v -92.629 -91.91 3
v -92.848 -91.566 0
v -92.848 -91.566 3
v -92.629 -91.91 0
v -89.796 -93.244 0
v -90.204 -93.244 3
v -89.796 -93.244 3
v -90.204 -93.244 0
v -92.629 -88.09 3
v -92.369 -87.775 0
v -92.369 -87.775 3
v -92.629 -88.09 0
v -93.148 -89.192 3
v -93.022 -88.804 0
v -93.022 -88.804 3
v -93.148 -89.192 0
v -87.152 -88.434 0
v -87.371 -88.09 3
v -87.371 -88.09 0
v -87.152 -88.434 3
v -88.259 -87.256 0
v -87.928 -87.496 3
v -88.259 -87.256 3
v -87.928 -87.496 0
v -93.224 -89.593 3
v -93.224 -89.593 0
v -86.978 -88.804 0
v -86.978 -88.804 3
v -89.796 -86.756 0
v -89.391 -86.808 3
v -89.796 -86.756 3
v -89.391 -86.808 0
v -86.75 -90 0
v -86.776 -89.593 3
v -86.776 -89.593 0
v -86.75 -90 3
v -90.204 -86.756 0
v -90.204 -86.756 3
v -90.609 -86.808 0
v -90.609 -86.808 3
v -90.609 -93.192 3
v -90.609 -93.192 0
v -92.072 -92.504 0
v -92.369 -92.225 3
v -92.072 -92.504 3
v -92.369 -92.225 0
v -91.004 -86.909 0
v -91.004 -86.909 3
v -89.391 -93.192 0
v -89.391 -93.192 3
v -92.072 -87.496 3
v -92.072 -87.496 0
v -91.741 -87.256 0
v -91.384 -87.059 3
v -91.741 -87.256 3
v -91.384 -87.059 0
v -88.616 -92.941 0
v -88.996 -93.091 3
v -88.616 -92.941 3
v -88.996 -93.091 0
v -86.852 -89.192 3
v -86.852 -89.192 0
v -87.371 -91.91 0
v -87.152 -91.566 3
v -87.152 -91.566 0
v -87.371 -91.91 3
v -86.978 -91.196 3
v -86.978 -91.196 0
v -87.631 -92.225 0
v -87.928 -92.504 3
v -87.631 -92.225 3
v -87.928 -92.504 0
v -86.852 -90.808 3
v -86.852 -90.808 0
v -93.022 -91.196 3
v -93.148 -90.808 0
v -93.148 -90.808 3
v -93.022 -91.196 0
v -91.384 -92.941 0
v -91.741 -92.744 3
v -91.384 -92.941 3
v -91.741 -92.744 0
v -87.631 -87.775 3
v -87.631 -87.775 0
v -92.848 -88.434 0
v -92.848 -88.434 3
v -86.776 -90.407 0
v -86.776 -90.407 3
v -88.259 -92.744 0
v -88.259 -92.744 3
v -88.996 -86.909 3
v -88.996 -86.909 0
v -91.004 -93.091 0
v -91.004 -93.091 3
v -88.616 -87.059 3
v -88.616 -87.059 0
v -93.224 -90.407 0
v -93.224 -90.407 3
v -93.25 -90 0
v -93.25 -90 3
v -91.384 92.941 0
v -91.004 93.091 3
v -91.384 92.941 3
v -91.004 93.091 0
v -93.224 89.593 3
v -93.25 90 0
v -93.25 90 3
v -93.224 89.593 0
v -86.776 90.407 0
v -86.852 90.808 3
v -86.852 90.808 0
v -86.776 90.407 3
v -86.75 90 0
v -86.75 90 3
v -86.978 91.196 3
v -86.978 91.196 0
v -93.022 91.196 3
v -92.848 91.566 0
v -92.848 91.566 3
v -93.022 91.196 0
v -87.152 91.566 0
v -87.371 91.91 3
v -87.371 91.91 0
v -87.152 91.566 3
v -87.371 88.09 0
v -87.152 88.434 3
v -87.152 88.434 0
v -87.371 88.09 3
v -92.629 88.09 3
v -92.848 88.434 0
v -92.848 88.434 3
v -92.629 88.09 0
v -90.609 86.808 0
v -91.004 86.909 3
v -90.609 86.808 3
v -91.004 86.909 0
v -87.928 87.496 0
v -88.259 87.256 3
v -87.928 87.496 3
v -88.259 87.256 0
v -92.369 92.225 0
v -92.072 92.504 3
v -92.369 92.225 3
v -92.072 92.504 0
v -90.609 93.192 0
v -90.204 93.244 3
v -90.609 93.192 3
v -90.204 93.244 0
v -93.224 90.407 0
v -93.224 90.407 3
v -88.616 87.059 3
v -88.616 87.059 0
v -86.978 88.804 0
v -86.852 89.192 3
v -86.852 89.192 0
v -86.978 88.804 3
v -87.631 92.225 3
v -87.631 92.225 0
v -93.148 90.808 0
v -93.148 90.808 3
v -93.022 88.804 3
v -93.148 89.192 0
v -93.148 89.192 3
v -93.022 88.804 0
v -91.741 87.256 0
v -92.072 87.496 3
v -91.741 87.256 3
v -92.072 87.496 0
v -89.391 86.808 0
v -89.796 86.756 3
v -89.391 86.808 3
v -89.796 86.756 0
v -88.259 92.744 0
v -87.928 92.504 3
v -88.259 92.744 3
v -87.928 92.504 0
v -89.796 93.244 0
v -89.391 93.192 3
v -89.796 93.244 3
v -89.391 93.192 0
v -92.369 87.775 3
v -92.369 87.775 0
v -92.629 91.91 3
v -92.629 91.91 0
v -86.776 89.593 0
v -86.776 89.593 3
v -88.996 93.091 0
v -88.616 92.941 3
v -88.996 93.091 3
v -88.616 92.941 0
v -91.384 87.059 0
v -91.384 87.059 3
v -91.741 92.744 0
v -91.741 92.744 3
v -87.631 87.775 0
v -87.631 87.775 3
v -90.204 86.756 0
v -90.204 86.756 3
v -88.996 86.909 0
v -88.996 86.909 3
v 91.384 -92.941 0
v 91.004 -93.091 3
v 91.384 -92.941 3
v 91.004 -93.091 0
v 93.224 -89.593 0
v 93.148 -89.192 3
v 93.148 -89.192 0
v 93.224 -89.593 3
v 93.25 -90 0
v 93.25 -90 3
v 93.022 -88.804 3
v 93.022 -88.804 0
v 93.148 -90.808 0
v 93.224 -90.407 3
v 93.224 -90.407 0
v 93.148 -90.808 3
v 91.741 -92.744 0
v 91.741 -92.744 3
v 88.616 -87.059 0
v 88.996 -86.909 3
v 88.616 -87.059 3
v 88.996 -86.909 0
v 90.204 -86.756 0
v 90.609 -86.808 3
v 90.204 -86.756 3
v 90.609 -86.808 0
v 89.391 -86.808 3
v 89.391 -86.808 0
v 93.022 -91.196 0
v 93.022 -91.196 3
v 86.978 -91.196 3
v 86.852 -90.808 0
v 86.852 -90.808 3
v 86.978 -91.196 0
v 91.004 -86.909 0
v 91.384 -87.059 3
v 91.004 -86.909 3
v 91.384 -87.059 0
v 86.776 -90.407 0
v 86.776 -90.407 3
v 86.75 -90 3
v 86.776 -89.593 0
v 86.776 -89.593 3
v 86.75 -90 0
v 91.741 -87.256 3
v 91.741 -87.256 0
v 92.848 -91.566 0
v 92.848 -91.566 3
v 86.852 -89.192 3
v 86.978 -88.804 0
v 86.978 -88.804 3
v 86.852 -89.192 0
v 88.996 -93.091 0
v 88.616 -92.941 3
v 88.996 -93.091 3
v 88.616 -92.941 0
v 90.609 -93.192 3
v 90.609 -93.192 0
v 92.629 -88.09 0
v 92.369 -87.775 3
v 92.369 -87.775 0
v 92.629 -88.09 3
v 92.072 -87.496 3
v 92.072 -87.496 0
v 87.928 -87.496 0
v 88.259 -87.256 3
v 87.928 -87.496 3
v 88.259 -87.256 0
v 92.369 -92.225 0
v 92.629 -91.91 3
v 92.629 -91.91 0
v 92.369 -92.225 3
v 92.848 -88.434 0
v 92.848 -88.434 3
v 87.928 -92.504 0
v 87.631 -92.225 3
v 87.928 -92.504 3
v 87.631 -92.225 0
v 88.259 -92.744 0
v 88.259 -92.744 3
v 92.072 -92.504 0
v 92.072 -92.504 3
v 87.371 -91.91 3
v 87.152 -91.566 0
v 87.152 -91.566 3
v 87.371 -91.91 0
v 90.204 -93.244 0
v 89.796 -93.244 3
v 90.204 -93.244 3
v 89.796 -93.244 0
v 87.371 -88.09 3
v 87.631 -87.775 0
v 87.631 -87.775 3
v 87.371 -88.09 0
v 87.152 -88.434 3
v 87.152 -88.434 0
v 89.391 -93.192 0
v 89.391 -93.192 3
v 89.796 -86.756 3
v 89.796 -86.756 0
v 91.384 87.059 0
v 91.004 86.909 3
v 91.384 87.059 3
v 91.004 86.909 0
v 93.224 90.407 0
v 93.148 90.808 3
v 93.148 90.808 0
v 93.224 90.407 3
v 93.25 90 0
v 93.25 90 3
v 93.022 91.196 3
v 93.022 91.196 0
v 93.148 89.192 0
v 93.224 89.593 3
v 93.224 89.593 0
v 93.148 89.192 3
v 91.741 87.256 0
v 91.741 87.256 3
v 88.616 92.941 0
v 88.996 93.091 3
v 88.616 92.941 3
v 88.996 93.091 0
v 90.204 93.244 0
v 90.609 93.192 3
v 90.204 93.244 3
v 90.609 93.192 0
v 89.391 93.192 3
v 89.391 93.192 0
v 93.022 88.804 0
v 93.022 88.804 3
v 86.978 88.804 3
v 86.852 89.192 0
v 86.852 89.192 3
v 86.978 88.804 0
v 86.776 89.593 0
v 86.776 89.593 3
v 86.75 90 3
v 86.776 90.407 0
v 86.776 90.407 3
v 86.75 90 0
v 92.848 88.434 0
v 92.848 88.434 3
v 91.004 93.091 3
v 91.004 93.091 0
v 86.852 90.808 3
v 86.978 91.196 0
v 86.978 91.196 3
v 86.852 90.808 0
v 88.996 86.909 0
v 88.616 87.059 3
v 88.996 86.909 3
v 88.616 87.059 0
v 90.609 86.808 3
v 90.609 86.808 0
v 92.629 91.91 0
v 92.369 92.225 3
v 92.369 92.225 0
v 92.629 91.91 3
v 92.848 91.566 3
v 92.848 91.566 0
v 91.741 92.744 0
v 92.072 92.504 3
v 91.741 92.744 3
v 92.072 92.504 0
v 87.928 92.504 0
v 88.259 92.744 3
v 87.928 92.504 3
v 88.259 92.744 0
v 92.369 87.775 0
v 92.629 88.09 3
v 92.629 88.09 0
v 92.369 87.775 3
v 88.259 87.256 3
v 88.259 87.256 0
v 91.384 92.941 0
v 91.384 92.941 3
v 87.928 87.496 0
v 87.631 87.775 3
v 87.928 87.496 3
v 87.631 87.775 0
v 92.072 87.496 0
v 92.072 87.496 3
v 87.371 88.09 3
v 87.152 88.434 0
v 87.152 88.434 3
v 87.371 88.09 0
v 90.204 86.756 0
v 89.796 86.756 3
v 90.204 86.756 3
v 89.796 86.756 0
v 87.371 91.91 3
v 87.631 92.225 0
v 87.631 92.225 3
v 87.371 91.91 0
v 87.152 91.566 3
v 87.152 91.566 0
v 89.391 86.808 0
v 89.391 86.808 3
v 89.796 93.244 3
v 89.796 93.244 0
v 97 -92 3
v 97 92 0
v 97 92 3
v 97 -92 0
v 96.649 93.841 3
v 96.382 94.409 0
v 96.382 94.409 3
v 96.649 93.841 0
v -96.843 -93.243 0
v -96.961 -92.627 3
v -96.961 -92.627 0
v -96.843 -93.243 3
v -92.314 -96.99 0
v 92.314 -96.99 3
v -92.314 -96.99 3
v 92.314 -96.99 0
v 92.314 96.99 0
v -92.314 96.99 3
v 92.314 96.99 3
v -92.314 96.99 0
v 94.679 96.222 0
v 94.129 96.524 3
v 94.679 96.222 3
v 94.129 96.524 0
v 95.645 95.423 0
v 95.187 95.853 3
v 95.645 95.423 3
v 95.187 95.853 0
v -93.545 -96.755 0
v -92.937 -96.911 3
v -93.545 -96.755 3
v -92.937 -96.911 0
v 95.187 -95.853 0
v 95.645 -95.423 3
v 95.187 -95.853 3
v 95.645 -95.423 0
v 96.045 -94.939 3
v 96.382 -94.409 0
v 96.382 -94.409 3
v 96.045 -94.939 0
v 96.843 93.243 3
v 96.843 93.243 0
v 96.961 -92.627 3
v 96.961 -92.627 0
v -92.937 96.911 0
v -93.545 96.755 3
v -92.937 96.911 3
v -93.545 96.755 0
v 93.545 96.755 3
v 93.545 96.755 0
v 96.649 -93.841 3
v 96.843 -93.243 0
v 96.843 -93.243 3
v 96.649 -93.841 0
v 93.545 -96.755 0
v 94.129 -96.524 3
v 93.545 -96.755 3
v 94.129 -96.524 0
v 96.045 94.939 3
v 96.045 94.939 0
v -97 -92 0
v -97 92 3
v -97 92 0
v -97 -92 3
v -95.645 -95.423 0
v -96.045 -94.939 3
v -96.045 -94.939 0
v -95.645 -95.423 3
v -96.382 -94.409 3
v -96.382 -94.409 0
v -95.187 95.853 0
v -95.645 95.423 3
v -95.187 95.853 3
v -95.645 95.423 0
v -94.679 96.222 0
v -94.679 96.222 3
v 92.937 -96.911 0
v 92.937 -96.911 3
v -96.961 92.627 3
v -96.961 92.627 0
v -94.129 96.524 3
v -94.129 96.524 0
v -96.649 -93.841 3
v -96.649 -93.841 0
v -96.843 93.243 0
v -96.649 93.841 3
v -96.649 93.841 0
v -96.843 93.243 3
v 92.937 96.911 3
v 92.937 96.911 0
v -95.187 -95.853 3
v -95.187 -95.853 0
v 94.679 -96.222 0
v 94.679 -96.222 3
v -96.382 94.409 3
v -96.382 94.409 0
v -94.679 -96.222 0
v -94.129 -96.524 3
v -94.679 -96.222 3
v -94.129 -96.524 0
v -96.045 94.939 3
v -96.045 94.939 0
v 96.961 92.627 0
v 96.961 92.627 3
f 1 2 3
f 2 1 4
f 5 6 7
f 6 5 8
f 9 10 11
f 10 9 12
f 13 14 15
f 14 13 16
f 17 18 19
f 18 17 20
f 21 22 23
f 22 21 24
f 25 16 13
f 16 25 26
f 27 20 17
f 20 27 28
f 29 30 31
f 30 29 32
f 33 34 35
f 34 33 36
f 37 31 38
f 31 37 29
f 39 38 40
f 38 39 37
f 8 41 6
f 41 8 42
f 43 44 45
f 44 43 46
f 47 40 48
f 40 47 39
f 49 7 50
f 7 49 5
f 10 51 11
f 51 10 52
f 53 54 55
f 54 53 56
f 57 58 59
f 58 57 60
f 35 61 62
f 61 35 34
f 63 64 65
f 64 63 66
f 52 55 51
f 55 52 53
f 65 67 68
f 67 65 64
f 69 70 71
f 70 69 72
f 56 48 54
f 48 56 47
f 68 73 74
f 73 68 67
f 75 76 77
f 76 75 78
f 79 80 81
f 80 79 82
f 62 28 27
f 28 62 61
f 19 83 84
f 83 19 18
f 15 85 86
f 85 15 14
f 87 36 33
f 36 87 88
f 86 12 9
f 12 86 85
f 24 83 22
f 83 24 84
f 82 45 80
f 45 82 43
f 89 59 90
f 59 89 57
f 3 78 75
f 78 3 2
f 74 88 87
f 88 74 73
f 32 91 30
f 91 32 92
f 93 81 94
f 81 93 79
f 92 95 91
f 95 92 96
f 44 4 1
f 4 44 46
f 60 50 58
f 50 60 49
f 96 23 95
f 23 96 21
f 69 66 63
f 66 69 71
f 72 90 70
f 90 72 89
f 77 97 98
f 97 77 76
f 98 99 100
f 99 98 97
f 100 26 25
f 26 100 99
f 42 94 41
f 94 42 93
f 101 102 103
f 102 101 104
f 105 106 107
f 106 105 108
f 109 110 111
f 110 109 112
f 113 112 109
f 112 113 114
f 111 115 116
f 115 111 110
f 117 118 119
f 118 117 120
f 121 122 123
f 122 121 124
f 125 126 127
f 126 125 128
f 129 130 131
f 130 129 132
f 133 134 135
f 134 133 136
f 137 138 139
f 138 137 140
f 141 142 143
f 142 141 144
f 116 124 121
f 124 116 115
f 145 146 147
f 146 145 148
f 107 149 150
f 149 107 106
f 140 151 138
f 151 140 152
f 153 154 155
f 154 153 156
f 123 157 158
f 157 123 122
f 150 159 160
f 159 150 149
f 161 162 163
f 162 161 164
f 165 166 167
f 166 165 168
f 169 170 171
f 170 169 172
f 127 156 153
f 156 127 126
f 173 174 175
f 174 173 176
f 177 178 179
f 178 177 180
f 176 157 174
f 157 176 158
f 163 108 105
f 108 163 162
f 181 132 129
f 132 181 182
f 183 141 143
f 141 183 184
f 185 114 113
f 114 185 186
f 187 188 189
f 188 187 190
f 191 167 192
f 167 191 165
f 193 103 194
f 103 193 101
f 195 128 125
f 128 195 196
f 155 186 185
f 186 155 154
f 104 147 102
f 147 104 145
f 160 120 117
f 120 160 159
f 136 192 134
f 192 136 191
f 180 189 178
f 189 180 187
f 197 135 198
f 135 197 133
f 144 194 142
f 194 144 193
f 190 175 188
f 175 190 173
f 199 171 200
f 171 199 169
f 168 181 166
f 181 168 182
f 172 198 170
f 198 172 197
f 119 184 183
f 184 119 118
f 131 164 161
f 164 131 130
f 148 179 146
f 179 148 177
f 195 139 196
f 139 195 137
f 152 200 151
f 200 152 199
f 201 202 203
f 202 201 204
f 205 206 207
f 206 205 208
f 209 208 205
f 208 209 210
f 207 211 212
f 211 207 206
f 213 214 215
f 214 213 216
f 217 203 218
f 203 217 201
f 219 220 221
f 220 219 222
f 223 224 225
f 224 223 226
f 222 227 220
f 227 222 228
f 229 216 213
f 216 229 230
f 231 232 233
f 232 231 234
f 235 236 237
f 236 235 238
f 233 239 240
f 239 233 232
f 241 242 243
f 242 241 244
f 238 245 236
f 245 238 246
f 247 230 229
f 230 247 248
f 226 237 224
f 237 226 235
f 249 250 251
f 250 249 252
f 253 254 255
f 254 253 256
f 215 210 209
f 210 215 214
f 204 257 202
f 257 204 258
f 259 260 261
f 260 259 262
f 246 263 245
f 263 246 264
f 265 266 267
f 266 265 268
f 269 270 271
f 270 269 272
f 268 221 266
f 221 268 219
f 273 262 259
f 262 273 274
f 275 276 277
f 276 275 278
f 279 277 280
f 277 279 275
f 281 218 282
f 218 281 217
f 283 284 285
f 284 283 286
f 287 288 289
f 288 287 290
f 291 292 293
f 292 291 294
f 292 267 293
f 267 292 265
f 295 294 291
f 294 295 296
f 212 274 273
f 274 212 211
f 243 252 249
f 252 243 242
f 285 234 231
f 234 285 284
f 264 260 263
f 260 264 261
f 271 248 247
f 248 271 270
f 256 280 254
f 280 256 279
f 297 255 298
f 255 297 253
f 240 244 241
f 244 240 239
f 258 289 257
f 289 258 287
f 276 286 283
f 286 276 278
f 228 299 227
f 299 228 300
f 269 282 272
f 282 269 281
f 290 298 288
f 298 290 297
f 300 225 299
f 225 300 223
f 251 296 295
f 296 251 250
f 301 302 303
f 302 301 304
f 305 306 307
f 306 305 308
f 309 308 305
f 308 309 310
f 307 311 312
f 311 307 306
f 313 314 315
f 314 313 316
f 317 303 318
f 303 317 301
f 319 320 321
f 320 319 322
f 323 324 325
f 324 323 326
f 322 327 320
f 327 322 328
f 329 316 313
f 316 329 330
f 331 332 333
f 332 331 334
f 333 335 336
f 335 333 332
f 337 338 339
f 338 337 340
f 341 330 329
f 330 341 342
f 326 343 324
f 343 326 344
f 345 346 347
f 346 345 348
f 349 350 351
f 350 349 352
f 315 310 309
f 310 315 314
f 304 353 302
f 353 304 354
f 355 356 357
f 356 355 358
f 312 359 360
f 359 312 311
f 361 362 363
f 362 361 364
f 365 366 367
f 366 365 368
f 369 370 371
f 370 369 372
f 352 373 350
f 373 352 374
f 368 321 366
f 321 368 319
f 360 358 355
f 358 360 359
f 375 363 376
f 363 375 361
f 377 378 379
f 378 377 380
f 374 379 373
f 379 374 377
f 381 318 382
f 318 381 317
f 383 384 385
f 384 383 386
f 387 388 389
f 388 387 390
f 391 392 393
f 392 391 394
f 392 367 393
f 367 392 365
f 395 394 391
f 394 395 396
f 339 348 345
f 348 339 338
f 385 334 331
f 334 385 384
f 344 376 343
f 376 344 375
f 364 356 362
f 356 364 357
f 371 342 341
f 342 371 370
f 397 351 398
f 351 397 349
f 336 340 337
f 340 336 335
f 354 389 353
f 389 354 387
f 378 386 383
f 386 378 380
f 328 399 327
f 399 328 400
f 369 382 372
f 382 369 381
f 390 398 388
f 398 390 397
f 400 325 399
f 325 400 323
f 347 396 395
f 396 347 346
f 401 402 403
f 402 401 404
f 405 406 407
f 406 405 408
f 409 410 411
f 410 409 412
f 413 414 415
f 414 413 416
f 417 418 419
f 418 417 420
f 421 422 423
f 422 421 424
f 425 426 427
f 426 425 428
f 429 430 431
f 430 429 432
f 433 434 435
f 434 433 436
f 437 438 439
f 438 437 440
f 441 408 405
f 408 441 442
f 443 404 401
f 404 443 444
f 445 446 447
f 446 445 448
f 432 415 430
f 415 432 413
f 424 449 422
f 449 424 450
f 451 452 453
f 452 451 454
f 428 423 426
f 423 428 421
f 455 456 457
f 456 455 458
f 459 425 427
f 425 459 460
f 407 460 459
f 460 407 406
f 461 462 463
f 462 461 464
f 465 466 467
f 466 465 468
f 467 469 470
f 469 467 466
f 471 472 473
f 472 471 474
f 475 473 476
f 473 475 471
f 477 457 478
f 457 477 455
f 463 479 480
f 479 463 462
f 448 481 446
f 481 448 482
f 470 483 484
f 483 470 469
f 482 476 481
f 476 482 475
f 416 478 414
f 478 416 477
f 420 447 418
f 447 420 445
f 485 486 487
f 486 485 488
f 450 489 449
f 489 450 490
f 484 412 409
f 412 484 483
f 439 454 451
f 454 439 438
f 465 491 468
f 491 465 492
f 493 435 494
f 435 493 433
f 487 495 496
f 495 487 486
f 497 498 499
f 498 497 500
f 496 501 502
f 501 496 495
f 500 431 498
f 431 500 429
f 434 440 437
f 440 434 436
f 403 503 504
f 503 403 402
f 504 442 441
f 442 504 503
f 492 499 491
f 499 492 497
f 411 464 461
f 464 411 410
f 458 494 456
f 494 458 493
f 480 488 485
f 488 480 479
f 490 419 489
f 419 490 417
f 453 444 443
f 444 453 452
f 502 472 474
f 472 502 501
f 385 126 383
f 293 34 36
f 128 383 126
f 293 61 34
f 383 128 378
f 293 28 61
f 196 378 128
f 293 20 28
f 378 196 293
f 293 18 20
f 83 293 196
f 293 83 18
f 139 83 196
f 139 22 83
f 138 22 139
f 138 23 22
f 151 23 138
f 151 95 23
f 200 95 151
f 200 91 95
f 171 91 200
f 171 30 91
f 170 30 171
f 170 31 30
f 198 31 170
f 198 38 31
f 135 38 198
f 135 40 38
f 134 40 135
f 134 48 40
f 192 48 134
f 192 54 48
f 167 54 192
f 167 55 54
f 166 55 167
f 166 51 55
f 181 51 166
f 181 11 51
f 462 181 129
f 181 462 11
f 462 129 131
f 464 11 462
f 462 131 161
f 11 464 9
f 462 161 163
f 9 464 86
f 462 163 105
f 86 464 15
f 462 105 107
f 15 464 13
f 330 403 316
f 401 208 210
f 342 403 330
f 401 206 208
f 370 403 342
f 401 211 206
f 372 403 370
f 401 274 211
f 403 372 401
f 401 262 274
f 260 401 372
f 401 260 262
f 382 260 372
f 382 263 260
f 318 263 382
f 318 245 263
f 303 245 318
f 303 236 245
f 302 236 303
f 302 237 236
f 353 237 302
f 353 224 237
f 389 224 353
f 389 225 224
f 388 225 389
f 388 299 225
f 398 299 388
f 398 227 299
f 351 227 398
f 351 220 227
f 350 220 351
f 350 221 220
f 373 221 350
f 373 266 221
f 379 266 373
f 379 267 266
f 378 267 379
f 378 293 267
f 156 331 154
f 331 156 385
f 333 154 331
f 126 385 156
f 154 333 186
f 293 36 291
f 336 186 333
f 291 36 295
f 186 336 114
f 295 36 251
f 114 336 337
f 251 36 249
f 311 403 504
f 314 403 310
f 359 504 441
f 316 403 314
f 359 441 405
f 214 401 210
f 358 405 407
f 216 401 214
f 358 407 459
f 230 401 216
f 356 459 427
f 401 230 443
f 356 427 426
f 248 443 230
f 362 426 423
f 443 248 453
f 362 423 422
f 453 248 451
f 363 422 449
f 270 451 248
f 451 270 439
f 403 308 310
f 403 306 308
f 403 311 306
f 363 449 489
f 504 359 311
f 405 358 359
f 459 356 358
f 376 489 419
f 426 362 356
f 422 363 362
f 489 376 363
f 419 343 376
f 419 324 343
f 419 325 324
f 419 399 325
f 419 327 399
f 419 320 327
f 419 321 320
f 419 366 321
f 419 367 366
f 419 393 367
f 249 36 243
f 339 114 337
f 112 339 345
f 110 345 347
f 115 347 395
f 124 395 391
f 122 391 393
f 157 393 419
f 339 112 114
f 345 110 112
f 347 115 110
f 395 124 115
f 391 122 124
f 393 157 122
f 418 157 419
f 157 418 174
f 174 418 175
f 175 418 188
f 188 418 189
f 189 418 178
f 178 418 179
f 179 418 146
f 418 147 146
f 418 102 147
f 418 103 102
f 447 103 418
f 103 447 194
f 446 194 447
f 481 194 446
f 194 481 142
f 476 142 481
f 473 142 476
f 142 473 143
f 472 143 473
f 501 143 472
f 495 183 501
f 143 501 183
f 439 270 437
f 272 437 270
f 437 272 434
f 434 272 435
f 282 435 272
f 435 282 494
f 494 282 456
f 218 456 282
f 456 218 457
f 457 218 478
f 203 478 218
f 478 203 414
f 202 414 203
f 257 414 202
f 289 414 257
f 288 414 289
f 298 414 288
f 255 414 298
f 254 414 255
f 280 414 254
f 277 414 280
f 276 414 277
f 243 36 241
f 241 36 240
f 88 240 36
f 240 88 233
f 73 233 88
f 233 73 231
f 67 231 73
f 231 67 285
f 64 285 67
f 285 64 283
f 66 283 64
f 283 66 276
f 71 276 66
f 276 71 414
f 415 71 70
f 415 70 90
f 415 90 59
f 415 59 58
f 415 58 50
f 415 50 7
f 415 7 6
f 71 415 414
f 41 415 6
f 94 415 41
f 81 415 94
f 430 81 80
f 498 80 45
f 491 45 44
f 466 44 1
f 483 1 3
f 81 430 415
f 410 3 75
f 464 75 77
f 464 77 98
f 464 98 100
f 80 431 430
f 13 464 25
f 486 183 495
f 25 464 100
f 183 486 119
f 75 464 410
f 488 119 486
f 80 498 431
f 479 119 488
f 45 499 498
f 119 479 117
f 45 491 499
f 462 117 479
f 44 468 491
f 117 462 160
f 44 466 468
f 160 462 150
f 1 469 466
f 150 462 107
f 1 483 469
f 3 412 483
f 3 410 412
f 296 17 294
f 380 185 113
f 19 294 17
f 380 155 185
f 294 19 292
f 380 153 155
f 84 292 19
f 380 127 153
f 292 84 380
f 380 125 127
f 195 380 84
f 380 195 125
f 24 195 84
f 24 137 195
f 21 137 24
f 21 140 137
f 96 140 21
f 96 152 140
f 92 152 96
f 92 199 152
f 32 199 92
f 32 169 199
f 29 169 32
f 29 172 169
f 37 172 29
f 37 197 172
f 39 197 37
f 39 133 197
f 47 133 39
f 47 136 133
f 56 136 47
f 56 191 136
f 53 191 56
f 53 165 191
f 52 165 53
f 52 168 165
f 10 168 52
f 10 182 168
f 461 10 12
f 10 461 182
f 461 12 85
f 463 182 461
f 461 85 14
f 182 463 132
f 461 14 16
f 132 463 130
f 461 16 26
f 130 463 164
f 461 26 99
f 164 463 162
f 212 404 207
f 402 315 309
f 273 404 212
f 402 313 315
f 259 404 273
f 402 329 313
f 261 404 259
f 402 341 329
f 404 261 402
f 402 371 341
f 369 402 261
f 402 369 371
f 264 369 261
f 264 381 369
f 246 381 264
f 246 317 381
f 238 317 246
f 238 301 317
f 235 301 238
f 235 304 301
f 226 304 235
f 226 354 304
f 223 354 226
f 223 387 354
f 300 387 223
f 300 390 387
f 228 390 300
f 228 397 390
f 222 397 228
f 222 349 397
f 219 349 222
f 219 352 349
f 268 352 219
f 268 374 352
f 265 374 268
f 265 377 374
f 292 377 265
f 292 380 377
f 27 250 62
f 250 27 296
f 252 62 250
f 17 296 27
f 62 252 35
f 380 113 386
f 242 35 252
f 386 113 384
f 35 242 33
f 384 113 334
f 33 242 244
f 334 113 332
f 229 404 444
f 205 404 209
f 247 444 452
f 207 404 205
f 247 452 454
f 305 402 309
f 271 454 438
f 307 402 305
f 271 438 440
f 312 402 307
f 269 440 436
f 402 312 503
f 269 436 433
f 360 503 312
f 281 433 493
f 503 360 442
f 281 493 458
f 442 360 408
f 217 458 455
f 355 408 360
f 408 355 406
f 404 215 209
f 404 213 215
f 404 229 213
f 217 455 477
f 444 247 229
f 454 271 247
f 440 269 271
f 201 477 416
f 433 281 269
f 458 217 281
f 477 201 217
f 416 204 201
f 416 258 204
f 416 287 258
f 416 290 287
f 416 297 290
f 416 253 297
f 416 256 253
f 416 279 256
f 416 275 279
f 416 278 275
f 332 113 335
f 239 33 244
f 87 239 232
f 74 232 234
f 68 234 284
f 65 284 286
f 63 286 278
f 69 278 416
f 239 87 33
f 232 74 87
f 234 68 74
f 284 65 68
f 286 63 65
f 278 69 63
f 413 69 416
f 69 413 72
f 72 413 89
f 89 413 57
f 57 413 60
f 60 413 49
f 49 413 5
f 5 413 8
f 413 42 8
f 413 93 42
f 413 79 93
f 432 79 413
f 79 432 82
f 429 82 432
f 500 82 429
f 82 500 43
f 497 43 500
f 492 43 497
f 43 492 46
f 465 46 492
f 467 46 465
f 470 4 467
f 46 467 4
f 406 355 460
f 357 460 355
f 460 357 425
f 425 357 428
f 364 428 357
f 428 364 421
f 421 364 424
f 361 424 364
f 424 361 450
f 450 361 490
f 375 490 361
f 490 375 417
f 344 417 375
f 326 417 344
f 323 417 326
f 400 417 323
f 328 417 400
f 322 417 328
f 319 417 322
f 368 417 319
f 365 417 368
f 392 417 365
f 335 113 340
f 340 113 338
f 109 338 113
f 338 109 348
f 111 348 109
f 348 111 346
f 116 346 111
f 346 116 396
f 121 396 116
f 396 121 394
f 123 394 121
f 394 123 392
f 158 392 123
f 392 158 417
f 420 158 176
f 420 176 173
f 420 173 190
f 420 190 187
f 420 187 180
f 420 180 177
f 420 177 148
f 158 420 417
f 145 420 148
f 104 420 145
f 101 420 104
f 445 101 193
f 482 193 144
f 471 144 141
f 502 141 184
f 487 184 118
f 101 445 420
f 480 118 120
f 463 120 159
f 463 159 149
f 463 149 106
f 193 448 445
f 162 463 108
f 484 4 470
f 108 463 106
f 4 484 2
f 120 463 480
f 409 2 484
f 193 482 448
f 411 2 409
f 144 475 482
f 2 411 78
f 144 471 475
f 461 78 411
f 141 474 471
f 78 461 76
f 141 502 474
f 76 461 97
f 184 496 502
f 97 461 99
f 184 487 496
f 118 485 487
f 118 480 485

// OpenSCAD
$fn = 50;


difference() {
	union() {
		hull() {
			translate(v = [-92.0000000000, 92.0000000000, 0]) {
				cylinder(h = 3, r = 5);
			}
			translate(v = [92.0000000000, 92.0000000000, 0]) {
				cylinder(h = 3, r = 5);
			}
			translate(v = [-92.0000000000, -92.0000000000, 0]) {
				cylinder(h = 3, r = 5);
			}
			translate(v = [92.0000000000, -92.0000000000, 0]) {
				cylinder(h = 3, r = 5);
			}
		}
	}
	union() {
		translate(v = [-90.0000000000, -90.0000000000, -100.0000000000]) {
			cylinder(h = 200, r = 3.2500000000);
		}
		translate(v = [-90.0000000000, 90.0000000000, -100.0000000000]) {
			cylinder(h = 200, r = 3.2500000000);
		}
		translate(v = [90.0000000000, -90.0000000000, -100.0000000000]) {
			cylinder(h = 200, r = 3.2500000000);
		}
		translate(v = [90.0000000000, 90.0000000000, -100.0000000000]) {
			cylinder(h = 200, r = 3.2500000000);
		}
	}
}
